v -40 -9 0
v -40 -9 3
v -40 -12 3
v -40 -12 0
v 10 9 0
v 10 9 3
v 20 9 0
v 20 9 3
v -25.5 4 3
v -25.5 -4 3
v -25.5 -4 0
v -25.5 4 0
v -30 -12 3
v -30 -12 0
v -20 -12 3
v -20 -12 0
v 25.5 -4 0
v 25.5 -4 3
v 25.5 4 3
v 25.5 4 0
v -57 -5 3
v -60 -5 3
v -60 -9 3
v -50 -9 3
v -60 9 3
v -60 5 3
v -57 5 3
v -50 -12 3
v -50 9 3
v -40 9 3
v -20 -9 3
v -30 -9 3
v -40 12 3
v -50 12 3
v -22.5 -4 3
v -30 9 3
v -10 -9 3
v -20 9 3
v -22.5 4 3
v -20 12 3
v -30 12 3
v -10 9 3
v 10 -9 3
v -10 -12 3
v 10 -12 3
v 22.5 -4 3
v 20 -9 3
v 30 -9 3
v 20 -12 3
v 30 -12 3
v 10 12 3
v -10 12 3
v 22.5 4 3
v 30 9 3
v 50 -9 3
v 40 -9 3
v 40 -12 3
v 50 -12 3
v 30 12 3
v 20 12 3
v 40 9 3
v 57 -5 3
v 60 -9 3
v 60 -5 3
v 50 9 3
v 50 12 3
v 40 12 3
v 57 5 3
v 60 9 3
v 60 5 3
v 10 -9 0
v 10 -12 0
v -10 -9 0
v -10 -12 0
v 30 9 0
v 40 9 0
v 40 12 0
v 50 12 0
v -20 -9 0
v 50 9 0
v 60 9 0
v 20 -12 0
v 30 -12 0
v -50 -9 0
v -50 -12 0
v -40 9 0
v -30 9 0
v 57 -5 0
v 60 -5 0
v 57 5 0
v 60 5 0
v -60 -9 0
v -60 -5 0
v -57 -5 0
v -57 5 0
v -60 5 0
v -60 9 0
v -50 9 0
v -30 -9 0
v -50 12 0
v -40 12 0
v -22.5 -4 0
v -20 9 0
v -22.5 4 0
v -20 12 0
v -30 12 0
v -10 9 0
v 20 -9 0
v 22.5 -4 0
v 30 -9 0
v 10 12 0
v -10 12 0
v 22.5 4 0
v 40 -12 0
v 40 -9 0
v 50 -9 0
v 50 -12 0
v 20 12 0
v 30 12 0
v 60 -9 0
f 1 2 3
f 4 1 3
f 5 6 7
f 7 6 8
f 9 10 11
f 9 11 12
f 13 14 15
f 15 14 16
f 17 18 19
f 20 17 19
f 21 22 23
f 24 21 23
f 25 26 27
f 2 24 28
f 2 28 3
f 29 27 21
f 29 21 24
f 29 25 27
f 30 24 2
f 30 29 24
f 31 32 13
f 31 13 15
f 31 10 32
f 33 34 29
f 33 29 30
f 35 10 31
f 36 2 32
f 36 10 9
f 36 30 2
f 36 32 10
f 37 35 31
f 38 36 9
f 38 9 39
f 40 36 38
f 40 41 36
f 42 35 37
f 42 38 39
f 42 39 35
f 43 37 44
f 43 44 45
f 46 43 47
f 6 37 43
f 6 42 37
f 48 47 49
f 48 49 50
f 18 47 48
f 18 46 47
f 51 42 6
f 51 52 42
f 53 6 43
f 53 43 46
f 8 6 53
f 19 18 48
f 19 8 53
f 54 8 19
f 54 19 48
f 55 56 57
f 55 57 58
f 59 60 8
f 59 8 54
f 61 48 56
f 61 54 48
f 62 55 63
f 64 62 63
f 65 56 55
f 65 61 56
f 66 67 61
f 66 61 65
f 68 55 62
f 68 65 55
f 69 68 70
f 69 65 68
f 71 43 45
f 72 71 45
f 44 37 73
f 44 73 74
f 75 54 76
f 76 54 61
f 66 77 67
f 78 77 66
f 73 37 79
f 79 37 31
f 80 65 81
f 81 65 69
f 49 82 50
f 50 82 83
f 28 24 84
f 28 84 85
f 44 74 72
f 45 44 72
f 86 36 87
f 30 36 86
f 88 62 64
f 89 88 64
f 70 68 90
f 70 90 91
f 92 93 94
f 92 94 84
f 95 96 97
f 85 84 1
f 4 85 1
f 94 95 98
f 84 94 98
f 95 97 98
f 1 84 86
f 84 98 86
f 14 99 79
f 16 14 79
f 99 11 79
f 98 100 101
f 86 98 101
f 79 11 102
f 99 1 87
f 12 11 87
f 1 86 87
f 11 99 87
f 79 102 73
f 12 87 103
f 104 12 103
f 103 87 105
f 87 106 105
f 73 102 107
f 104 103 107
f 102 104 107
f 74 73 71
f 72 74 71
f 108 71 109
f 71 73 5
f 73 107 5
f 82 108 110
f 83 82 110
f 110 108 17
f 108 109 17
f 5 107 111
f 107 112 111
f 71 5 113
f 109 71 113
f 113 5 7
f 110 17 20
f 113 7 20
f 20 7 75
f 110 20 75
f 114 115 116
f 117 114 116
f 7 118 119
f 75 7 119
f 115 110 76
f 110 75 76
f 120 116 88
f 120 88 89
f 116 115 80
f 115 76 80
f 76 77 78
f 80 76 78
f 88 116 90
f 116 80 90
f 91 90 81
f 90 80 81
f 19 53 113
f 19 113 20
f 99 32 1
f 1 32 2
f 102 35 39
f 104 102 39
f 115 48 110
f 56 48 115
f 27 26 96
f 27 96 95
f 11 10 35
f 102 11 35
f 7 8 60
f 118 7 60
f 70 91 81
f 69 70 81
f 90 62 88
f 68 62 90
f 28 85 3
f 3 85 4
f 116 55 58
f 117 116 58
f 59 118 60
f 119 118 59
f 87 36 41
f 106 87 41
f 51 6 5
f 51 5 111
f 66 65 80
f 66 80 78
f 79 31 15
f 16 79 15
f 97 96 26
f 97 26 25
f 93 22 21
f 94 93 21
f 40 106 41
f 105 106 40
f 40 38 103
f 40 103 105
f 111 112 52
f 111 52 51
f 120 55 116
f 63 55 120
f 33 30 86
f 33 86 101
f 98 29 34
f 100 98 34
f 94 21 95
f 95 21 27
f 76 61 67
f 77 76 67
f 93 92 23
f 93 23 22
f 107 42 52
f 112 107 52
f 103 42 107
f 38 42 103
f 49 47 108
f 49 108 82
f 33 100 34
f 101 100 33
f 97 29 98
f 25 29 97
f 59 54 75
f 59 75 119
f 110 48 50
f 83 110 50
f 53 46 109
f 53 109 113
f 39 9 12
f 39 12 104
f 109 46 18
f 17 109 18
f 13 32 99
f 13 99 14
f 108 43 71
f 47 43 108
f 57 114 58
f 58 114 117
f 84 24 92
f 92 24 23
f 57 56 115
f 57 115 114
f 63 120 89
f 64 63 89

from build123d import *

# Parameters (mm, degrees)
SKETCH1_W               = 120
SKETCH1_H               = 24
BOSS_EXTRUDE1_DEPTH     = 3
SKETCH2_W               = 10
SKETCH2_H               = 3
CUT_EXTRUDE1_DEPTH      = 4
MIRROR3_COPY_1_SKETCH_W = 10
MIRROR3_COPY_1_SKETCH_H = 3
MIRROR3_COPY_1_DEPTH    = 4
SKETCH3_W               = 3
SKETCH3_H               = 8
SKETCH3_H_2             = 10
CUT_EXTRUDE2_DEPTH      = 4


with BuildPart() as part:
    # Sketch1 → Boss-Extrude1 (new body)
    with BuildSketch(Plane.XY):
        Rectangle(SKETCH1_W, SKETCH1_H)
    extrude(amount=BOSS_EXTRUDE1_DEPTH)

    # Sketch2 → Cut-Extrude1 (cut, through all)
    with BuildSketch(Plane.XY.offset(3)):
        with Locations((15, 10.5)):
            Rectangle(SKETCH2_W, SKETCH2_H)
        with Locations((35, 10.5)):
            Rectangle(SKETCH2_W, SKETCH2_H)
        with Locations((55, 10.5)):
            Rectangle(SKETCH2_W, SKETCH2_H)
    cut_extrude1 = extrude(amount=-CUT_EXTRUDE1_DEPTH, mode=Mode.SUBTRACT)

    # Mirror2: Cut-Extrude1 across plane
    add(cut_extrude1.mirror(Plane(origin=(0, 0, 0), x_dir=(0, 0, 1), z_dir=(1, 0, 0))), mode=Mode.SUBTRACT)

    # Mirror3: Cut-Extrude1 across plane
    add(cut_extrude1.mirror(Plane.ZX), mode=Mode.SUBTRACT)

    # Mirror3 copy 1 sketch → Mirror3 copy 1 (cut, through all)
    with BuildSketch(Plane(origin=(0, 0, 3), x_dir=(-1, 0, 0), z_dir=(0, 0, 1))):
        with Locations((15, 10.5)):
            Rectangle(MIRROR3_COPY_1_SKETCH_W, MIRROR3_COPY_1_SKETCH_H)
        with Locations((35, 10.5)):
            Rectangle(MIRROR3_COPY_1_SKETCH_W, MIRROR3_COPY_1_SKETCH_H)
        with Locations((55, 10.5)):
            Rectangle(MIRROR3_COPY_1_SKETCH_W, MIRROR3_COPY_1_SKETCH_H)
    extrude(amount=-MIRROR3_COPY_1_DEPTH, mode=Mode.SUBTRACT)

    # Sketch3 → Cut-Extrude2 (cut, through all)
    with BuildSketch(Plane.XY.offset(3)):
        with Locations((24, 0)):
            Rectangle(SKETCH3_W, SKETCH3_H)
        with Locations((-24, 0)):
            Rectangle(SKETCH3_W, SKETCH3_H)
        with Locations((58.5, 0)):
            Rectangle(SKETCH3_W, SKETCH3_H_2)
        with Locations((-58.5, 0)):
            Rectangle(SKETCH3_W, SKETCH3_H_2)
    extrude(amount=-CUT_EXTRUDE2_DEPTH, mode=Mode.SUBTRACT)


solid = part.part
